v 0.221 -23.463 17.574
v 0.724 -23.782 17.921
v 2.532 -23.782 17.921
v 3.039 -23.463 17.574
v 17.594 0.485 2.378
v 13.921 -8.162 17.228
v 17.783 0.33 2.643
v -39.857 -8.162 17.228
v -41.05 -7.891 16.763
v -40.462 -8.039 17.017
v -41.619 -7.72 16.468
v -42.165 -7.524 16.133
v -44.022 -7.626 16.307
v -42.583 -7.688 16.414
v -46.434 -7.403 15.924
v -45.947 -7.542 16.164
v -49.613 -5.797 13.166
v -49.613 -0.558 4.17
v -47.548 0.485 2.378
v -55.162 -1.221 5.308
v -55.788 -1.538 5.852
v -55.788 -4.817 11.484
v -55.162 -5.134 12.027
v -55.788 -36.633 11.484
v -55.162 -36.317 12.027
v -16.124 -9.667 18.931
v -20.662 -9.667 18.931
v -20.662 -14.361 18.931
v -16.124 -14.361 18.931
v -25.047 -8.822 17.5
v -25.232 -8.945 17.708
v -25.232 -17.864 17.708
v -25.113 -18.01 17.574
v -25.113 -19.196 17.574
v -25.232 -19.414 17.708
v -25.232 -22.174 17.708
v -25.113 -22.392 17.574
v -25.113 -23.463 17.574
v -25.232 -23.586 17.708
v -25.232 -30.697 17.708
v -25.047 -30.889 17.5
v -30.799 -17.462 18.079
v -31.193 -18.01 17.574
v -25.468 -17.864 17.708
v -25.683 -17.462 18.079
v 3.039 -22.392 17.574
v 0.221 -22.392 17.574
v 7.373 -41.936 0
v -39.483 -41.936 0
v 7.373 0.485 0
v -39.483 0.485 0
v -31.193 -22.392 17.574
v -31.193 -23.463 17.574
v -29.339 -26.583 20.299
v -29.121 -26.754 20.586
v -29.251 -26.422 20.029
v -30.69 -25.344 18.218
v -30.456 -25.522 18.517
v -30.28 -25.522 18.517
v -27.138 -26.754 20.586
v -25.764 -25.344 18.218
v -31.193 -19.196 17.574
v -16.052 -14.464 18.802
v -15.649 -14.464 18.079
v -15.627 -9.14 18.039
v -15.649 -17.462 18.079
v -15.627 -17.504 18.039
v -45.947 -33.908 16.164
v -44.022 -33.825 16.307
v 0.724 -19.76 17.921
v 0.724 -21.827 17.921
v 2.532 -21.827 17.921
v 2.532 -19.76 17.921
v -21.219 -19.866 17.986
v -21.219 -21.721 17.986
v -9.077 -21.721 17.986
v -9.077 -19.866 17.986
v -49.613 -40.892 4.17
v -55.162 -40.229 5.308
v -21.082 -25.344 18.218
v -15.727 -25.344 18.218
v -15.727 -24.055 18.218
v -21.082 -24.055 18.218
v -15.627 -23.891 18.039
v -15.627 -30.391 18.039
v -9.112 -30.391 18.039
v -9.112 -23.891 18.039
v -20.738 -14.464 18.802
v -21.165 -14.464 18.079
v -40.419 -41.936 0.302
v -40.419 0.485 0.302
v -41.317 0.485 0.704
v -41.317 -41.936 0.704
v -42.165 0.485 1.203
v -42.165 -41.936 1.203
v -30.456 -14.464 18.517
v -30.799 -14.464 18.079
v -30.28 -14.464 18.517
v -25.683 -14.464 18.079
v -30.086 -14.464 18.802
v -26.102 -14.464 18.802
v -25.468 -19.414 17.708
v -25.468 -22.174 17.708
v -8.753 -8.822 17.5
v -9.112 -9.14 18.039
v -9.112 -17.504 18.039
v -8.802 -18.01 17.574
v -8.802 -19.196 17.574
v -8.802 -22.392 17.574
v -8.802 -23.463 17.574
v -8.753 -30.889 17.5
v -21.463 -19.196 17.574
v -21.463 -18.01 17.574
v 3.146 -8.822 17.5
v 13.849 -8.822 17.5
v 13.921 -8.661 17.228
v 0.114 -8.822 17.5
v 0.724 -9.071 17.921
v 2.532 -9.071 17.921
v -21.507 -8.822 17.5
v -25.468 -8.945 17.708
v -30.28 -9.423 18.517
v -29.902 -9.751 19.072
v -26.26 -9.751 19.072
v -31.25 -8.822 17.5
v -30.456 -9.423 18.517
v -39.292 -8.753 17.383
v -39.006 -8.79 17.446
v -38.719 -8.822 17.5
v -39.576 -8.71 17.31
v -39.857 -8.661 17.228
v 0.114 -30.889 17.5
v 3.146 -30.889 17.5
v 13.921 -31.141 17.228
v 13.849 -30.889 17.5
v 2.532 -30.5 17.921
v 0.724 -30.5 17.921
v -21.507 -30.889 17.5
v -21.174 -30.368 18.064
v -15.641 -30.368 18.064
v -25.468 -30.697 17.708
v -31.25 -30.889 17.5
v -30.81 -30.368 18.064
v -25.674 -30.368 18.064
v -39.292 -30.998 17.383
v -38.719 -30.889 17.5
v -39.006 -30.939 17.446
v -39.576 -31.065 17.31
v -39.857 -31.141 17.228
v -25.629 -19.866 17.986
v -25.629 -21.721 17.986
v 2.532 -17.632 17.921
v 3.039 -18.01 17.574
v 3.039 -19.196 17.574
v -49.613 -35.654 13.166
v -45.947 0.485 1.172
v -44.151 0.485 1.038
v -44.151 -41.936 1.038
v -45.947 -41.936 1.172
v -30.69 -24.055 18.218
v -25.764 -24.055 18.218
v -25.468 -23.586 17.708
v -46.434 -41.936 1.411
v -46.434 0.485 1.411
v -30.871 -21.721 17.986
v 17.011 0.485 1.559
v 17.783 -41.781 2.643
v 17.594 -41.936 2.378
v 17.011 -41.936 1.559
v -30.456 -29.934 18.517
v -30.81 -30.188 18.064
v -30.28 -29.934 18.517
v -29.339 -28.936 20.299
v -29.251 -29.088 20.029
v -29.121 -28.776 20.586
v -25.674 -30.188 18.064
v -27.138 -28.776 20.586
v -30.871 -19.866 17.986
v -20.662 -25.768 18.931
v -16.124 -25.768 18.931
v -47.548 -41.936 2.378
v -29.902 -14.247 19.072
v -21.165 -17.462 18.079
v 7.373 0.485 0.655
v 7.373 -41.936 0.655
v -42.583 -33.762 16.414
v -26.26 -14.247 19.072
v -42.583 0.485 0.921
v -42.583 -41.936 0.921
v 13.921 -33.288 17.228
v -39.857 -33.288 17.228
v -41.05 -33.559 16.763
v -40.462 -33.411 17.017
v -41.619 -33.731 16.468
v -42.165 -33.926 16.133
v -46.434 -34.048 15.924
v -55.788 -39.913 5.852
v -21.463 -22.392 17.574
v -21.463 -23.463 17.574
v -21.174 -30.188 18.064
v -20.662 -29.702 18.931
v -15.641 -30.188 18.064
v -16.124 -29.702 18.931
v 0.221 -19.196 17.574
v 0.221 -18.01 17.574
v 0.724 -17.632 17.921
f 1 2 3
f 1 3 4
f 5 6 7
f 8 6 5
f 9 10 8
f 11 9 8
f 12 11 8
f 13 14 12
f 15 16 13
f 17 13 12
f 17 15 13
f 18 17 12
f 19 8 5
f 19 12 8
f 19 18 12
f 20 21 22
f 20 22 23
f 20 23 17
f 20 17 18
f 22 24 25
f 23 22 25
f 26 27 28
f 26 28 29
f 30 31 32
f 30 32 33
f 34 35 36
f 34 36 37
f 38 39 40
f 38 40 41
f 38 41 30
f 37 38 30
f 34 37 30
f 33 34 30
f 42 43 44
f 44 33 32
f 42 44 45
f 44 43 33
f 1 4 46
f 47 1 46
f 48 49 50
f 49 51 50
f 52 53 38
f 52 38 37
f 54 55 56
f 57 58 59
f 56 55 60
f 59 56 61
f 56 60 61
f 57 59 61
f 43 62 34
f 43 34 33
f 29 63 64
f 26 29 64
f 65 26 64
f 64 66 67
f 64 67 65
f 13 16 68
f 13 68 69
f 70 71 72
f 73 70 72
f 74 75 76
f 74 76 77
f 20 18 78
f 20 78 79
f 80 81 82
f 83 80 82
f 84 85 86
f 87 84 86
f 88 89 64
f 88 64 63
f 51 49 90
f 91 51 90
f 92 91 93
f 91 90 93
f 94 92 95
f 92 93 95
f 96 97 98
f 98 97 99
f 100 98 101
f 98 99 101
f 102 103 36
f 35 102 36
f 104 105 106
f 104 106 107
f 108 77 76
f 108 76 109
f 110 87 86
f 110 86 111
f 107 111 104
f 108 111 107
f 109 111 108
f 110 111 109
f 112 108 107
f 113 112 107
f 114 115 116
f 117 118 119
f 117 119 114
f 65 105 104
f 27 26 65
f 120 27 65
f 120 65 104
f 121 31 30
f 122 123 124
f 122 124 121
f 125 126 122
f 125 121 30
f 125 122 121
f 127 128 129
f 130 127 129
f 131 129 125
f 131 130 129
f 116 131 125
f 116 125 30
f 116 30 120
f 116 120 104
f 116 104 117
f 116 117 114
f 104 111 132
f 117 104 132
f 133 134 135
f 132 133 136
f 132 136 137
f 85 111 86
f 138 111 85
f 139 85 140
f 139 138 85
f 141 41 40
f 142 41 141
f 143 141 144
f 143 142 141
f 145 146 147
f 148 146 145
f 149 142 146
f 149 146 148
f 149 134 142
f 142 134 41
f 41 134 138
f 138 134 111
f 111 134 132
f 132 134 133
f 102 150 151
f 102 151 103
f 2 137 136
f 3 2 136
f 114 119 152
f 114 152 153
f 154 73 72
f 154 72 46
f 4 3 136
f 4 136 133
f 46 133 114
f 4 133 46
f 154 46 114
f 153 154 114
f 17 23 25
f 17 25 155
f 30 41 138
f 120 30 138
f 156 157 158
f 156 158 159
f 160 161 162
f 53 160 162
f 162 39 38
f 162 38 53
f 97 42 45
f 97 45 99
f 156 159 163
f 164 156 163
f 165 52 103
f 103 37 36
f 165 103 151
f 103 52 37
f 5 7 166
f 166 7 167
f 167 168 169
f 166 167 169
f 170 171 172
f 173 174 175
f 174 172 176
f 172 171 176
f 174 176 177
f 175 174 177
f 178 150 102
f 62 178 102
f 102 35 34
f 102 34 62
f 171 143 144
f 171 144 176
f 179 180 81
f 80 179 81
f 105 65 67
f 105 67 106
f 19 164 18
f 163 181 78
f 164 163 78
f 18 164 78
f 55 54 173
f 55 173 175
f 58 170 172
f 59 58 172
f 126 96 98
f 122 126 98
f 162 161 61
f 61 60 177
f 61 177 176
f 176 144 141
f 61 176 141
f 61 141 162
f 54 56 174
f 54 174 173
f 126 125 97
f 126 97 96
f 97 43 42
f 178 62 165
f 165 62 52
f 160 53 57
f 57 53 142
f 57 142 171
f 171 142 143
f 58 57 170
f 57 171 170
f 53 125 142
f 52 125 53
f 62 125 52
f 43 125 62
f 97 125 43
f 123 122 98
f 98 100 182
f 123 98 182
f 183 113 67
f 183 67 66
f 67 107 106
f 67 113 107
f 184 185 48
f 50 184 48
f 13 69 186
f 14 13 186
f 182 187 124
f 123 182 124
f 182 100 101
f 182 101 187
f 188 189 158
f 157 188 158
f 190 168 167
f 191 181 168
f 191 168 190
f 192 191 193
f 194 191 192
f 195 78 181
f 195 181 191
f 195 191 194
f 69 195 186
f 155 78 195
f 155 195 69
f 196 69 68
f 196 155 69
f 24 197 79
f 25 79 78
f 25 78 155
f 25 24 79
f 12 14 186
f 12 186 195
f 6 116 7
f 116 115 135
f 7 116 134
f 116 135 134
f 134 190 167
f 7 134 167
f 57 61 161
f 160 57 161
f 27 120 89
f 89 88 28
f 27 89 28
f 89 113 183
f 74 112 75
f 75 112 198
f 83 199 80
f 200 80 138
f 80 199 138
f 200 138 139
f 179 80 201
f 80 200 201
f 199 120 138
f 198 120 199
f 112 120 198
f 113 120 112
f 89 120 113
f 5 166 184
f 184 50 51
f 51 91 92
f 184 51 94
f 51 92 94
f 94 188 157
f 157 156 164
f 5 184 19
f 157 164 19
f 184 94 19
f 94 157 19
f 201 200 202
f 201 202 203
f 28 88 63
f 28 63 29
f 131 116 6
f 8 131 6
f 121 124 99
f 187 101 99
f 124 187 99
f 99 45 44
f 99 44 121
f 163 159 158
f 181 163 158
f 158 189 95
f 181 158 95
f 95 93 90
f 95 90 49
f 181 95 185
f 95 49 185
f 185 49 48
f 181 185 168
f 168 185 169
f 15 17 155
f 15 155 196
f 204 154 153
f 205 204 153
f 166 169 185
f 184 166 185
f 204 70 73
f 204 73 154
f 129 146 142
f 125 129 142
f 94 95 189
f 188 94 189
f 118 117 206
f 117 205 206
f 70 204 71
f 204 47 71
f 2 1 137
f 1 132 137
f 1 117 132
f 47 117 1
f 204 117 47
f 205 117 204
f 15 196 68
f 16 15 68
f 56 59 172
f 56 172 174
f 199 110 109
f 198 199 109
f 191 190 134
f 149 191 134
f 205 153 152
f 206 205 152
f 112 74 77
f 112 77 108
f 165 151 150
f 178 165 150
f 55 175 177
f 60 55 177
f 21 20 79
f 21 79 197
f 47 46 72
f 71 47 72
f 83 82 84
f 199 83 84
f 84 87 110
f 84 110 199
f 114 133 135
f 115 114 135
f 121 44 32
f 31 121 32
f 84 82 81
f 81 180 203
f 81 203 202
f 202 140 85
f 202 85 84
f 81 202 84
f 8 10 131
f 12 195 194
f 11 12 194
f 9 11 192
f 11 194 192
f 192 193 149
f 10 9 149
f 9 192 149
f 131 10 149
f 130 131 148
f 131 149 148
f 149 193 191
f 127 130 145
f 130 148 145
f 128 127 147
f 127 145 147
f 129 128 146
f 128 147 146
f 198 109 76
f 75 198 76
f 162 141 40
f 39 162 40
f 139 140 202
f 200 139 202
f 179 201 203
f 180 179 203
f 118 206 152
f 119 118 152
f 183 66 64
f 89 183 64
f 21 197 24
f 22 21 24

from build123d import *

# Parameters (mm, degrees)
F0_W     = 64.5160431693
F0_H     = 21.2102837178
F1_DEPTH = 25.4
F3_DEPTH = 51.816
F5_DEPTH = 78.486
F6_DEPTH = 43.18


with BuildPart() as f1:
    # F0 (on Top) → F1 (new body)
    with BuildSketch(Plane.XY):
        with Locations((-13.5457146427, -10.1202105203)):
            Rectangle(F0_W, F0_H)
        with Locations((-13.5457146427, -31.3304942381)):
            Rectangle(F0_W, F0_H)
        Polygon((-56.0653362274, -41.935636097), (-45.8037362274, -41.935636097), (-45.8037362274, -20.7253523792), (-45.8037362274, 0.4849313386), (-56.0653362274, 0.4849313386), (-56.0653362274, -20.7253523792), align=None)
    extrude(amount=F1_DEPTH)

    # F2 (on face) → F3 (cut)
    with BuildSketch(Plane.XZ.offset(41.935636097)):
        with BuildLine():
            ThreePointArc((-44.145979319, 1.0321285638), (-44.1486688564, 1.034928695), (-44.1513573992, 1.0377297813))
            Line((-44.1513573992, 1.0377297813), (-45.9468774498, 1.1715529611))
            Line((-45.9468774498, 1.1715529611), (-44.145979319, 1.0321285638))
        make_face()
        with BuildLine():
            Line((-44.021862033, 16.3071069646), (-42.5827212101, 16.4143685911))
            ThreePointArc((-42.5827212101, 16.4143685911), (-42.5963025327, 16.4205333574), (-42.6111564435, 16.4218816897))
            Line((-42.6111564435, 16.4218816897), (-44.0158800553, 16.3131288738))
            ThreePointArc((-44.0158800553, 16.3131288738), (-44.0188716286, 16.3101184998), (-44.021862033, 16.3071069646))
        make_face()
        with BuildLine():
            Line((-45.9468774498, 16.1636322737), (-44.021862033, 16.3071069646))
            ThreePointArc((-44.021862033, 16.3071069646), (-44.0188716286, 16.3101184998), (-44.0158800553, 16.3131288738))
            Line((-44.0158800553, 16.3131288738), (-45.9468774498, 16.1636322737))
        make_face()
        with BuildLine():
            Line((7.372798217, 0), (-39.4825406605, 0))
            ThreePointArc((-39.4825406605, 0), (-38.9420590995, -0.1240575085), (-38.3949389733, -0.2144463942))
            Line((-38.3949389733, -0.2144463942), (7.372798217, -0.2144463942))
            Line((7.372798217, -0.2144463942), (7.372798217, 0))
        make_face()
        with BuildLine():
            ThreePointArc((-42.1654908366, 16.1326498601), (-40.5135421796, 16.9967749546), (-38.7185404025, 17.5003771437))
            Line((-38.7185404025, 17.5003771437), (-31.250141561, 17.5003771437))
            Line((-31.250141561, 17.5003771437), (-30.4561574012, 18.5174327344))
            Line((-30.4561574012, 18.5174327344), (-30.2798189223, 18.5174327344))
            Line((-30.2798189223, 18.5174327344), (-29.2510185391, 20.0290549546))
            Line((-29.2510185391, 20.0290549546), (-29.3390378356, 20.2990490943))
            Line((-29.3390378356, 20.2990490943), (-29.12097238, 20.5859038979))
            Line((-29.12097238, 20.5859038979), (-27.1381475031, 20.5859038979))
            Line((-27.1381475031, 20.5859038979), (-25.4679527134, 17.7082661539))
            Line((-25.4679527134, 17.7082661539), (-25.2317674458, 17.7082661539))
            Line((-25.2317674458, 17.7082661539), (-25.0472072512, 17.5003771437))
            Line((-25.0472072512, 17.5003771437), (-21.5065404773, 17.5003771437))
            Line((-21.5065404773, 17.5003771437), (-20.6615831703, 18.9307779074))
            Line((-20.6615831703, 18.9307779074), (-16.1240063608, 18.9307779074))
            Line((-16.1240063608, 18.9307779074), (-15.6271327287, 18.0392824113))
            Line((-15.6271327287, 18.0392824113), (-9.1119576246, 18.0392824113))
            Line((-9.1119576246, 18.0392824113), (-8.7532978505, 17.5003771437))
            Line((-8.7532978505, 17.5003771437), (0.1143061163, 17.5003771437))
            Line((0.1143061163, 17.5003771437), (0.7239317638, 17.9214961827))
            Line((0.7239317638, 17.9214961827), (2.5316779502, 17.9214961827))
            Line((2.5316779502, 17.9214961827), (3.1462397892, 17.5003771437))
            Line((3.1462397892, 17.5003771437), (13.8490989856, 17.5003771437))
            Line((13.8490989856, 17.5003771437), (17.7825259097, 2.6434083702))
            Line((17.7825259097, 2.6434083702), (17.0111356355, 1.5585501678))
            Line((17.0111356355, 1.5585501678), (7.372798217, 0.6550194812))
            Line((7.372798217, 0.6550194812), (7.372798217, 0))
            Line((7.372798217, 0), (18.7123069419, 0))
            Line((18.7123069419, 0), (18.7123069419, 25.4))
            Line((18.7123069419, 25.4), (-56.0653362274, 25.4))
            Line((-56.0653362274, 25.4), (-56.0653362274, 0))
            Line((-56.0653362274, 0), (-39.4825406605, 0))
            ThreePointArc((-39.4825406605, 0), (-40.8736718435, 0.4904810681), (-42.1654908366, 1.2025353747))
            Line((-42.1654908366, 1.2025353747), (-42.5827212101, 0.9208166436))
            Line((-42.5827212101, 0.9208166436), (-44.1513573992, 1.0377297813))
            ThreePointArc((-44.1513573992, 1.0377297813), (-44.1486688564, 1.034928695), (-44.145979319, 1.0321285638))
            Line((-44.145979319, 1.0321285638), (-45.9468774498, 1.1715529611))
            Line((-45.9468774498, 1.1715529611), (-46.4343652129, 1.4113573482))
            Line((-46.4343652129, 1.4113573482), (-49.6125221252, 4.1695129251))
            Line((-49.6125221252, 4.1695129251), (-55.1616996527, 5.3079299753))
            Line((-55.1616996527, 5.3079299753), (-55.7882027962, 5.8516391712))
            Line((-55.7882027962, 5.8516391712), (-55.7882027962, 8.6675926174))
            Line((-55.7882027962, 8.6675926174), (-55.7882027962, 11.4835460635))
            Line((-55.7882027962, 11.4835460635), (-55.1616996527, 12.0272552595))
            Line((-55.1616996527, 12.0272552595), (-49.6125221252, 13.1656723097))
            Line((-49.6125221252, 13.1656723097), (-46.4343652129, 15.9238278866))
            Line((-46.4343652129, 15.9238278866), (-45.9468774498, 16.1636322737))
            Line((-45.9468774498, 16.1636322737), (-44.0158800553, 16.3131288738))
            Line((-44.0158800553, 16.3131288738), (-42.6111564435, 16.4218816897))
            ThreePointArc((-42.6111564435, 16.4218816897), (-42.5963025327, 16.4205333574), (-42.5827212101, 16.4143685911))
            Line((-42.5827212101, 16.4143685911), (-42.1654908366, 16.1326498601))
        make_face()
    extrude(amount=-F3_DEPTH, mode=Mode.SUBTRACT)

    # F4 (on Right) → F5 (cut)
    with BuildSketch(Plane.YZ):
        Polygon((-9.7505459562, 19.0722569823), (-8.6611686274, 17.2283314168), (-8.1623115887, 17.2283314168), (0.8263854931, 1.7911824398), (1.259337645, 21.2465394288), (-42.2770902514, 21.2465394288), (-42.2770902514, 1.7911824398), (-33.2883931696, 17.2283314168), (-31.1412010342, 17.2283314168), (-30.3681883961, 18.0637445301), (-30.1878191531, 18.0637445301), (-28.7448633462, 20.6411108375), (-26.786563918, 20.6411108375), (-25.3436081111, 18.2183869183), (-24.0552537143, 18.2183869183), (-23.4626121819, 17.5740458071), (-22.3917532712, 17.5740458071), (-21.7214301229, 17.9864261299), (-19.8657140136, 17.9864261299), (-19.1957950592, 17.5740458071), (-18.0102344602, 17.5740458071), (-17.4616630302, 18.078601868), (-14.4639806944, 18.078601868), (-14.4639806944, 18.8015084714), (-14.2472516745, 19.0722569823), align=None)
    extrude(amount=-F5_DEPTH, mode=Mode.SUBTRACT)

    # F4 (on Right) → F6 (cut)
    with BuildSketch(Plane.YZ):
        Polygon((-9.7505459562, 19.0722569823), (-8.6611686274, 17.2283314168), (-8.1623115887, 17.2283314168), (0.8263854931, 1.7911824398), (1.259337645, 21.2465394288), (-42.2770902514, 21.2465394288), (-42.2770902514, 1.7911824398), (-33.2883931696, 17.2283314168), (-31.1412010342, 17.2283314168), (-30.3681883961, 18.0637445301), (-30.1878191531, 18.0637445301), (-28.7448633462, 20.6411108375), (-26.786563918, 20.6411108375), (-25.3436081111, 18.2183869183), (-24.0552537143, 18.2183869183), (-23.4626121819, 17.5740458071), (-22.3917532712, 17.5740458071), (-21.7214301229, 17.9864261299), (-19.8657140136, 17.9864261299), (-19.1957950592, 17.5740458071), (-18.0102344602, 17.5740458071), (-17.4616630302, 18.078601868), (-14.4639806944, 18.078601868), (-14.4639806944, 18.8015084714), (-14.2472516745, 19.0722569823), align=None)
    extrude(amount=F6_DEPTH, mode=Mode.SUBTRACT)


solid = f1.part
